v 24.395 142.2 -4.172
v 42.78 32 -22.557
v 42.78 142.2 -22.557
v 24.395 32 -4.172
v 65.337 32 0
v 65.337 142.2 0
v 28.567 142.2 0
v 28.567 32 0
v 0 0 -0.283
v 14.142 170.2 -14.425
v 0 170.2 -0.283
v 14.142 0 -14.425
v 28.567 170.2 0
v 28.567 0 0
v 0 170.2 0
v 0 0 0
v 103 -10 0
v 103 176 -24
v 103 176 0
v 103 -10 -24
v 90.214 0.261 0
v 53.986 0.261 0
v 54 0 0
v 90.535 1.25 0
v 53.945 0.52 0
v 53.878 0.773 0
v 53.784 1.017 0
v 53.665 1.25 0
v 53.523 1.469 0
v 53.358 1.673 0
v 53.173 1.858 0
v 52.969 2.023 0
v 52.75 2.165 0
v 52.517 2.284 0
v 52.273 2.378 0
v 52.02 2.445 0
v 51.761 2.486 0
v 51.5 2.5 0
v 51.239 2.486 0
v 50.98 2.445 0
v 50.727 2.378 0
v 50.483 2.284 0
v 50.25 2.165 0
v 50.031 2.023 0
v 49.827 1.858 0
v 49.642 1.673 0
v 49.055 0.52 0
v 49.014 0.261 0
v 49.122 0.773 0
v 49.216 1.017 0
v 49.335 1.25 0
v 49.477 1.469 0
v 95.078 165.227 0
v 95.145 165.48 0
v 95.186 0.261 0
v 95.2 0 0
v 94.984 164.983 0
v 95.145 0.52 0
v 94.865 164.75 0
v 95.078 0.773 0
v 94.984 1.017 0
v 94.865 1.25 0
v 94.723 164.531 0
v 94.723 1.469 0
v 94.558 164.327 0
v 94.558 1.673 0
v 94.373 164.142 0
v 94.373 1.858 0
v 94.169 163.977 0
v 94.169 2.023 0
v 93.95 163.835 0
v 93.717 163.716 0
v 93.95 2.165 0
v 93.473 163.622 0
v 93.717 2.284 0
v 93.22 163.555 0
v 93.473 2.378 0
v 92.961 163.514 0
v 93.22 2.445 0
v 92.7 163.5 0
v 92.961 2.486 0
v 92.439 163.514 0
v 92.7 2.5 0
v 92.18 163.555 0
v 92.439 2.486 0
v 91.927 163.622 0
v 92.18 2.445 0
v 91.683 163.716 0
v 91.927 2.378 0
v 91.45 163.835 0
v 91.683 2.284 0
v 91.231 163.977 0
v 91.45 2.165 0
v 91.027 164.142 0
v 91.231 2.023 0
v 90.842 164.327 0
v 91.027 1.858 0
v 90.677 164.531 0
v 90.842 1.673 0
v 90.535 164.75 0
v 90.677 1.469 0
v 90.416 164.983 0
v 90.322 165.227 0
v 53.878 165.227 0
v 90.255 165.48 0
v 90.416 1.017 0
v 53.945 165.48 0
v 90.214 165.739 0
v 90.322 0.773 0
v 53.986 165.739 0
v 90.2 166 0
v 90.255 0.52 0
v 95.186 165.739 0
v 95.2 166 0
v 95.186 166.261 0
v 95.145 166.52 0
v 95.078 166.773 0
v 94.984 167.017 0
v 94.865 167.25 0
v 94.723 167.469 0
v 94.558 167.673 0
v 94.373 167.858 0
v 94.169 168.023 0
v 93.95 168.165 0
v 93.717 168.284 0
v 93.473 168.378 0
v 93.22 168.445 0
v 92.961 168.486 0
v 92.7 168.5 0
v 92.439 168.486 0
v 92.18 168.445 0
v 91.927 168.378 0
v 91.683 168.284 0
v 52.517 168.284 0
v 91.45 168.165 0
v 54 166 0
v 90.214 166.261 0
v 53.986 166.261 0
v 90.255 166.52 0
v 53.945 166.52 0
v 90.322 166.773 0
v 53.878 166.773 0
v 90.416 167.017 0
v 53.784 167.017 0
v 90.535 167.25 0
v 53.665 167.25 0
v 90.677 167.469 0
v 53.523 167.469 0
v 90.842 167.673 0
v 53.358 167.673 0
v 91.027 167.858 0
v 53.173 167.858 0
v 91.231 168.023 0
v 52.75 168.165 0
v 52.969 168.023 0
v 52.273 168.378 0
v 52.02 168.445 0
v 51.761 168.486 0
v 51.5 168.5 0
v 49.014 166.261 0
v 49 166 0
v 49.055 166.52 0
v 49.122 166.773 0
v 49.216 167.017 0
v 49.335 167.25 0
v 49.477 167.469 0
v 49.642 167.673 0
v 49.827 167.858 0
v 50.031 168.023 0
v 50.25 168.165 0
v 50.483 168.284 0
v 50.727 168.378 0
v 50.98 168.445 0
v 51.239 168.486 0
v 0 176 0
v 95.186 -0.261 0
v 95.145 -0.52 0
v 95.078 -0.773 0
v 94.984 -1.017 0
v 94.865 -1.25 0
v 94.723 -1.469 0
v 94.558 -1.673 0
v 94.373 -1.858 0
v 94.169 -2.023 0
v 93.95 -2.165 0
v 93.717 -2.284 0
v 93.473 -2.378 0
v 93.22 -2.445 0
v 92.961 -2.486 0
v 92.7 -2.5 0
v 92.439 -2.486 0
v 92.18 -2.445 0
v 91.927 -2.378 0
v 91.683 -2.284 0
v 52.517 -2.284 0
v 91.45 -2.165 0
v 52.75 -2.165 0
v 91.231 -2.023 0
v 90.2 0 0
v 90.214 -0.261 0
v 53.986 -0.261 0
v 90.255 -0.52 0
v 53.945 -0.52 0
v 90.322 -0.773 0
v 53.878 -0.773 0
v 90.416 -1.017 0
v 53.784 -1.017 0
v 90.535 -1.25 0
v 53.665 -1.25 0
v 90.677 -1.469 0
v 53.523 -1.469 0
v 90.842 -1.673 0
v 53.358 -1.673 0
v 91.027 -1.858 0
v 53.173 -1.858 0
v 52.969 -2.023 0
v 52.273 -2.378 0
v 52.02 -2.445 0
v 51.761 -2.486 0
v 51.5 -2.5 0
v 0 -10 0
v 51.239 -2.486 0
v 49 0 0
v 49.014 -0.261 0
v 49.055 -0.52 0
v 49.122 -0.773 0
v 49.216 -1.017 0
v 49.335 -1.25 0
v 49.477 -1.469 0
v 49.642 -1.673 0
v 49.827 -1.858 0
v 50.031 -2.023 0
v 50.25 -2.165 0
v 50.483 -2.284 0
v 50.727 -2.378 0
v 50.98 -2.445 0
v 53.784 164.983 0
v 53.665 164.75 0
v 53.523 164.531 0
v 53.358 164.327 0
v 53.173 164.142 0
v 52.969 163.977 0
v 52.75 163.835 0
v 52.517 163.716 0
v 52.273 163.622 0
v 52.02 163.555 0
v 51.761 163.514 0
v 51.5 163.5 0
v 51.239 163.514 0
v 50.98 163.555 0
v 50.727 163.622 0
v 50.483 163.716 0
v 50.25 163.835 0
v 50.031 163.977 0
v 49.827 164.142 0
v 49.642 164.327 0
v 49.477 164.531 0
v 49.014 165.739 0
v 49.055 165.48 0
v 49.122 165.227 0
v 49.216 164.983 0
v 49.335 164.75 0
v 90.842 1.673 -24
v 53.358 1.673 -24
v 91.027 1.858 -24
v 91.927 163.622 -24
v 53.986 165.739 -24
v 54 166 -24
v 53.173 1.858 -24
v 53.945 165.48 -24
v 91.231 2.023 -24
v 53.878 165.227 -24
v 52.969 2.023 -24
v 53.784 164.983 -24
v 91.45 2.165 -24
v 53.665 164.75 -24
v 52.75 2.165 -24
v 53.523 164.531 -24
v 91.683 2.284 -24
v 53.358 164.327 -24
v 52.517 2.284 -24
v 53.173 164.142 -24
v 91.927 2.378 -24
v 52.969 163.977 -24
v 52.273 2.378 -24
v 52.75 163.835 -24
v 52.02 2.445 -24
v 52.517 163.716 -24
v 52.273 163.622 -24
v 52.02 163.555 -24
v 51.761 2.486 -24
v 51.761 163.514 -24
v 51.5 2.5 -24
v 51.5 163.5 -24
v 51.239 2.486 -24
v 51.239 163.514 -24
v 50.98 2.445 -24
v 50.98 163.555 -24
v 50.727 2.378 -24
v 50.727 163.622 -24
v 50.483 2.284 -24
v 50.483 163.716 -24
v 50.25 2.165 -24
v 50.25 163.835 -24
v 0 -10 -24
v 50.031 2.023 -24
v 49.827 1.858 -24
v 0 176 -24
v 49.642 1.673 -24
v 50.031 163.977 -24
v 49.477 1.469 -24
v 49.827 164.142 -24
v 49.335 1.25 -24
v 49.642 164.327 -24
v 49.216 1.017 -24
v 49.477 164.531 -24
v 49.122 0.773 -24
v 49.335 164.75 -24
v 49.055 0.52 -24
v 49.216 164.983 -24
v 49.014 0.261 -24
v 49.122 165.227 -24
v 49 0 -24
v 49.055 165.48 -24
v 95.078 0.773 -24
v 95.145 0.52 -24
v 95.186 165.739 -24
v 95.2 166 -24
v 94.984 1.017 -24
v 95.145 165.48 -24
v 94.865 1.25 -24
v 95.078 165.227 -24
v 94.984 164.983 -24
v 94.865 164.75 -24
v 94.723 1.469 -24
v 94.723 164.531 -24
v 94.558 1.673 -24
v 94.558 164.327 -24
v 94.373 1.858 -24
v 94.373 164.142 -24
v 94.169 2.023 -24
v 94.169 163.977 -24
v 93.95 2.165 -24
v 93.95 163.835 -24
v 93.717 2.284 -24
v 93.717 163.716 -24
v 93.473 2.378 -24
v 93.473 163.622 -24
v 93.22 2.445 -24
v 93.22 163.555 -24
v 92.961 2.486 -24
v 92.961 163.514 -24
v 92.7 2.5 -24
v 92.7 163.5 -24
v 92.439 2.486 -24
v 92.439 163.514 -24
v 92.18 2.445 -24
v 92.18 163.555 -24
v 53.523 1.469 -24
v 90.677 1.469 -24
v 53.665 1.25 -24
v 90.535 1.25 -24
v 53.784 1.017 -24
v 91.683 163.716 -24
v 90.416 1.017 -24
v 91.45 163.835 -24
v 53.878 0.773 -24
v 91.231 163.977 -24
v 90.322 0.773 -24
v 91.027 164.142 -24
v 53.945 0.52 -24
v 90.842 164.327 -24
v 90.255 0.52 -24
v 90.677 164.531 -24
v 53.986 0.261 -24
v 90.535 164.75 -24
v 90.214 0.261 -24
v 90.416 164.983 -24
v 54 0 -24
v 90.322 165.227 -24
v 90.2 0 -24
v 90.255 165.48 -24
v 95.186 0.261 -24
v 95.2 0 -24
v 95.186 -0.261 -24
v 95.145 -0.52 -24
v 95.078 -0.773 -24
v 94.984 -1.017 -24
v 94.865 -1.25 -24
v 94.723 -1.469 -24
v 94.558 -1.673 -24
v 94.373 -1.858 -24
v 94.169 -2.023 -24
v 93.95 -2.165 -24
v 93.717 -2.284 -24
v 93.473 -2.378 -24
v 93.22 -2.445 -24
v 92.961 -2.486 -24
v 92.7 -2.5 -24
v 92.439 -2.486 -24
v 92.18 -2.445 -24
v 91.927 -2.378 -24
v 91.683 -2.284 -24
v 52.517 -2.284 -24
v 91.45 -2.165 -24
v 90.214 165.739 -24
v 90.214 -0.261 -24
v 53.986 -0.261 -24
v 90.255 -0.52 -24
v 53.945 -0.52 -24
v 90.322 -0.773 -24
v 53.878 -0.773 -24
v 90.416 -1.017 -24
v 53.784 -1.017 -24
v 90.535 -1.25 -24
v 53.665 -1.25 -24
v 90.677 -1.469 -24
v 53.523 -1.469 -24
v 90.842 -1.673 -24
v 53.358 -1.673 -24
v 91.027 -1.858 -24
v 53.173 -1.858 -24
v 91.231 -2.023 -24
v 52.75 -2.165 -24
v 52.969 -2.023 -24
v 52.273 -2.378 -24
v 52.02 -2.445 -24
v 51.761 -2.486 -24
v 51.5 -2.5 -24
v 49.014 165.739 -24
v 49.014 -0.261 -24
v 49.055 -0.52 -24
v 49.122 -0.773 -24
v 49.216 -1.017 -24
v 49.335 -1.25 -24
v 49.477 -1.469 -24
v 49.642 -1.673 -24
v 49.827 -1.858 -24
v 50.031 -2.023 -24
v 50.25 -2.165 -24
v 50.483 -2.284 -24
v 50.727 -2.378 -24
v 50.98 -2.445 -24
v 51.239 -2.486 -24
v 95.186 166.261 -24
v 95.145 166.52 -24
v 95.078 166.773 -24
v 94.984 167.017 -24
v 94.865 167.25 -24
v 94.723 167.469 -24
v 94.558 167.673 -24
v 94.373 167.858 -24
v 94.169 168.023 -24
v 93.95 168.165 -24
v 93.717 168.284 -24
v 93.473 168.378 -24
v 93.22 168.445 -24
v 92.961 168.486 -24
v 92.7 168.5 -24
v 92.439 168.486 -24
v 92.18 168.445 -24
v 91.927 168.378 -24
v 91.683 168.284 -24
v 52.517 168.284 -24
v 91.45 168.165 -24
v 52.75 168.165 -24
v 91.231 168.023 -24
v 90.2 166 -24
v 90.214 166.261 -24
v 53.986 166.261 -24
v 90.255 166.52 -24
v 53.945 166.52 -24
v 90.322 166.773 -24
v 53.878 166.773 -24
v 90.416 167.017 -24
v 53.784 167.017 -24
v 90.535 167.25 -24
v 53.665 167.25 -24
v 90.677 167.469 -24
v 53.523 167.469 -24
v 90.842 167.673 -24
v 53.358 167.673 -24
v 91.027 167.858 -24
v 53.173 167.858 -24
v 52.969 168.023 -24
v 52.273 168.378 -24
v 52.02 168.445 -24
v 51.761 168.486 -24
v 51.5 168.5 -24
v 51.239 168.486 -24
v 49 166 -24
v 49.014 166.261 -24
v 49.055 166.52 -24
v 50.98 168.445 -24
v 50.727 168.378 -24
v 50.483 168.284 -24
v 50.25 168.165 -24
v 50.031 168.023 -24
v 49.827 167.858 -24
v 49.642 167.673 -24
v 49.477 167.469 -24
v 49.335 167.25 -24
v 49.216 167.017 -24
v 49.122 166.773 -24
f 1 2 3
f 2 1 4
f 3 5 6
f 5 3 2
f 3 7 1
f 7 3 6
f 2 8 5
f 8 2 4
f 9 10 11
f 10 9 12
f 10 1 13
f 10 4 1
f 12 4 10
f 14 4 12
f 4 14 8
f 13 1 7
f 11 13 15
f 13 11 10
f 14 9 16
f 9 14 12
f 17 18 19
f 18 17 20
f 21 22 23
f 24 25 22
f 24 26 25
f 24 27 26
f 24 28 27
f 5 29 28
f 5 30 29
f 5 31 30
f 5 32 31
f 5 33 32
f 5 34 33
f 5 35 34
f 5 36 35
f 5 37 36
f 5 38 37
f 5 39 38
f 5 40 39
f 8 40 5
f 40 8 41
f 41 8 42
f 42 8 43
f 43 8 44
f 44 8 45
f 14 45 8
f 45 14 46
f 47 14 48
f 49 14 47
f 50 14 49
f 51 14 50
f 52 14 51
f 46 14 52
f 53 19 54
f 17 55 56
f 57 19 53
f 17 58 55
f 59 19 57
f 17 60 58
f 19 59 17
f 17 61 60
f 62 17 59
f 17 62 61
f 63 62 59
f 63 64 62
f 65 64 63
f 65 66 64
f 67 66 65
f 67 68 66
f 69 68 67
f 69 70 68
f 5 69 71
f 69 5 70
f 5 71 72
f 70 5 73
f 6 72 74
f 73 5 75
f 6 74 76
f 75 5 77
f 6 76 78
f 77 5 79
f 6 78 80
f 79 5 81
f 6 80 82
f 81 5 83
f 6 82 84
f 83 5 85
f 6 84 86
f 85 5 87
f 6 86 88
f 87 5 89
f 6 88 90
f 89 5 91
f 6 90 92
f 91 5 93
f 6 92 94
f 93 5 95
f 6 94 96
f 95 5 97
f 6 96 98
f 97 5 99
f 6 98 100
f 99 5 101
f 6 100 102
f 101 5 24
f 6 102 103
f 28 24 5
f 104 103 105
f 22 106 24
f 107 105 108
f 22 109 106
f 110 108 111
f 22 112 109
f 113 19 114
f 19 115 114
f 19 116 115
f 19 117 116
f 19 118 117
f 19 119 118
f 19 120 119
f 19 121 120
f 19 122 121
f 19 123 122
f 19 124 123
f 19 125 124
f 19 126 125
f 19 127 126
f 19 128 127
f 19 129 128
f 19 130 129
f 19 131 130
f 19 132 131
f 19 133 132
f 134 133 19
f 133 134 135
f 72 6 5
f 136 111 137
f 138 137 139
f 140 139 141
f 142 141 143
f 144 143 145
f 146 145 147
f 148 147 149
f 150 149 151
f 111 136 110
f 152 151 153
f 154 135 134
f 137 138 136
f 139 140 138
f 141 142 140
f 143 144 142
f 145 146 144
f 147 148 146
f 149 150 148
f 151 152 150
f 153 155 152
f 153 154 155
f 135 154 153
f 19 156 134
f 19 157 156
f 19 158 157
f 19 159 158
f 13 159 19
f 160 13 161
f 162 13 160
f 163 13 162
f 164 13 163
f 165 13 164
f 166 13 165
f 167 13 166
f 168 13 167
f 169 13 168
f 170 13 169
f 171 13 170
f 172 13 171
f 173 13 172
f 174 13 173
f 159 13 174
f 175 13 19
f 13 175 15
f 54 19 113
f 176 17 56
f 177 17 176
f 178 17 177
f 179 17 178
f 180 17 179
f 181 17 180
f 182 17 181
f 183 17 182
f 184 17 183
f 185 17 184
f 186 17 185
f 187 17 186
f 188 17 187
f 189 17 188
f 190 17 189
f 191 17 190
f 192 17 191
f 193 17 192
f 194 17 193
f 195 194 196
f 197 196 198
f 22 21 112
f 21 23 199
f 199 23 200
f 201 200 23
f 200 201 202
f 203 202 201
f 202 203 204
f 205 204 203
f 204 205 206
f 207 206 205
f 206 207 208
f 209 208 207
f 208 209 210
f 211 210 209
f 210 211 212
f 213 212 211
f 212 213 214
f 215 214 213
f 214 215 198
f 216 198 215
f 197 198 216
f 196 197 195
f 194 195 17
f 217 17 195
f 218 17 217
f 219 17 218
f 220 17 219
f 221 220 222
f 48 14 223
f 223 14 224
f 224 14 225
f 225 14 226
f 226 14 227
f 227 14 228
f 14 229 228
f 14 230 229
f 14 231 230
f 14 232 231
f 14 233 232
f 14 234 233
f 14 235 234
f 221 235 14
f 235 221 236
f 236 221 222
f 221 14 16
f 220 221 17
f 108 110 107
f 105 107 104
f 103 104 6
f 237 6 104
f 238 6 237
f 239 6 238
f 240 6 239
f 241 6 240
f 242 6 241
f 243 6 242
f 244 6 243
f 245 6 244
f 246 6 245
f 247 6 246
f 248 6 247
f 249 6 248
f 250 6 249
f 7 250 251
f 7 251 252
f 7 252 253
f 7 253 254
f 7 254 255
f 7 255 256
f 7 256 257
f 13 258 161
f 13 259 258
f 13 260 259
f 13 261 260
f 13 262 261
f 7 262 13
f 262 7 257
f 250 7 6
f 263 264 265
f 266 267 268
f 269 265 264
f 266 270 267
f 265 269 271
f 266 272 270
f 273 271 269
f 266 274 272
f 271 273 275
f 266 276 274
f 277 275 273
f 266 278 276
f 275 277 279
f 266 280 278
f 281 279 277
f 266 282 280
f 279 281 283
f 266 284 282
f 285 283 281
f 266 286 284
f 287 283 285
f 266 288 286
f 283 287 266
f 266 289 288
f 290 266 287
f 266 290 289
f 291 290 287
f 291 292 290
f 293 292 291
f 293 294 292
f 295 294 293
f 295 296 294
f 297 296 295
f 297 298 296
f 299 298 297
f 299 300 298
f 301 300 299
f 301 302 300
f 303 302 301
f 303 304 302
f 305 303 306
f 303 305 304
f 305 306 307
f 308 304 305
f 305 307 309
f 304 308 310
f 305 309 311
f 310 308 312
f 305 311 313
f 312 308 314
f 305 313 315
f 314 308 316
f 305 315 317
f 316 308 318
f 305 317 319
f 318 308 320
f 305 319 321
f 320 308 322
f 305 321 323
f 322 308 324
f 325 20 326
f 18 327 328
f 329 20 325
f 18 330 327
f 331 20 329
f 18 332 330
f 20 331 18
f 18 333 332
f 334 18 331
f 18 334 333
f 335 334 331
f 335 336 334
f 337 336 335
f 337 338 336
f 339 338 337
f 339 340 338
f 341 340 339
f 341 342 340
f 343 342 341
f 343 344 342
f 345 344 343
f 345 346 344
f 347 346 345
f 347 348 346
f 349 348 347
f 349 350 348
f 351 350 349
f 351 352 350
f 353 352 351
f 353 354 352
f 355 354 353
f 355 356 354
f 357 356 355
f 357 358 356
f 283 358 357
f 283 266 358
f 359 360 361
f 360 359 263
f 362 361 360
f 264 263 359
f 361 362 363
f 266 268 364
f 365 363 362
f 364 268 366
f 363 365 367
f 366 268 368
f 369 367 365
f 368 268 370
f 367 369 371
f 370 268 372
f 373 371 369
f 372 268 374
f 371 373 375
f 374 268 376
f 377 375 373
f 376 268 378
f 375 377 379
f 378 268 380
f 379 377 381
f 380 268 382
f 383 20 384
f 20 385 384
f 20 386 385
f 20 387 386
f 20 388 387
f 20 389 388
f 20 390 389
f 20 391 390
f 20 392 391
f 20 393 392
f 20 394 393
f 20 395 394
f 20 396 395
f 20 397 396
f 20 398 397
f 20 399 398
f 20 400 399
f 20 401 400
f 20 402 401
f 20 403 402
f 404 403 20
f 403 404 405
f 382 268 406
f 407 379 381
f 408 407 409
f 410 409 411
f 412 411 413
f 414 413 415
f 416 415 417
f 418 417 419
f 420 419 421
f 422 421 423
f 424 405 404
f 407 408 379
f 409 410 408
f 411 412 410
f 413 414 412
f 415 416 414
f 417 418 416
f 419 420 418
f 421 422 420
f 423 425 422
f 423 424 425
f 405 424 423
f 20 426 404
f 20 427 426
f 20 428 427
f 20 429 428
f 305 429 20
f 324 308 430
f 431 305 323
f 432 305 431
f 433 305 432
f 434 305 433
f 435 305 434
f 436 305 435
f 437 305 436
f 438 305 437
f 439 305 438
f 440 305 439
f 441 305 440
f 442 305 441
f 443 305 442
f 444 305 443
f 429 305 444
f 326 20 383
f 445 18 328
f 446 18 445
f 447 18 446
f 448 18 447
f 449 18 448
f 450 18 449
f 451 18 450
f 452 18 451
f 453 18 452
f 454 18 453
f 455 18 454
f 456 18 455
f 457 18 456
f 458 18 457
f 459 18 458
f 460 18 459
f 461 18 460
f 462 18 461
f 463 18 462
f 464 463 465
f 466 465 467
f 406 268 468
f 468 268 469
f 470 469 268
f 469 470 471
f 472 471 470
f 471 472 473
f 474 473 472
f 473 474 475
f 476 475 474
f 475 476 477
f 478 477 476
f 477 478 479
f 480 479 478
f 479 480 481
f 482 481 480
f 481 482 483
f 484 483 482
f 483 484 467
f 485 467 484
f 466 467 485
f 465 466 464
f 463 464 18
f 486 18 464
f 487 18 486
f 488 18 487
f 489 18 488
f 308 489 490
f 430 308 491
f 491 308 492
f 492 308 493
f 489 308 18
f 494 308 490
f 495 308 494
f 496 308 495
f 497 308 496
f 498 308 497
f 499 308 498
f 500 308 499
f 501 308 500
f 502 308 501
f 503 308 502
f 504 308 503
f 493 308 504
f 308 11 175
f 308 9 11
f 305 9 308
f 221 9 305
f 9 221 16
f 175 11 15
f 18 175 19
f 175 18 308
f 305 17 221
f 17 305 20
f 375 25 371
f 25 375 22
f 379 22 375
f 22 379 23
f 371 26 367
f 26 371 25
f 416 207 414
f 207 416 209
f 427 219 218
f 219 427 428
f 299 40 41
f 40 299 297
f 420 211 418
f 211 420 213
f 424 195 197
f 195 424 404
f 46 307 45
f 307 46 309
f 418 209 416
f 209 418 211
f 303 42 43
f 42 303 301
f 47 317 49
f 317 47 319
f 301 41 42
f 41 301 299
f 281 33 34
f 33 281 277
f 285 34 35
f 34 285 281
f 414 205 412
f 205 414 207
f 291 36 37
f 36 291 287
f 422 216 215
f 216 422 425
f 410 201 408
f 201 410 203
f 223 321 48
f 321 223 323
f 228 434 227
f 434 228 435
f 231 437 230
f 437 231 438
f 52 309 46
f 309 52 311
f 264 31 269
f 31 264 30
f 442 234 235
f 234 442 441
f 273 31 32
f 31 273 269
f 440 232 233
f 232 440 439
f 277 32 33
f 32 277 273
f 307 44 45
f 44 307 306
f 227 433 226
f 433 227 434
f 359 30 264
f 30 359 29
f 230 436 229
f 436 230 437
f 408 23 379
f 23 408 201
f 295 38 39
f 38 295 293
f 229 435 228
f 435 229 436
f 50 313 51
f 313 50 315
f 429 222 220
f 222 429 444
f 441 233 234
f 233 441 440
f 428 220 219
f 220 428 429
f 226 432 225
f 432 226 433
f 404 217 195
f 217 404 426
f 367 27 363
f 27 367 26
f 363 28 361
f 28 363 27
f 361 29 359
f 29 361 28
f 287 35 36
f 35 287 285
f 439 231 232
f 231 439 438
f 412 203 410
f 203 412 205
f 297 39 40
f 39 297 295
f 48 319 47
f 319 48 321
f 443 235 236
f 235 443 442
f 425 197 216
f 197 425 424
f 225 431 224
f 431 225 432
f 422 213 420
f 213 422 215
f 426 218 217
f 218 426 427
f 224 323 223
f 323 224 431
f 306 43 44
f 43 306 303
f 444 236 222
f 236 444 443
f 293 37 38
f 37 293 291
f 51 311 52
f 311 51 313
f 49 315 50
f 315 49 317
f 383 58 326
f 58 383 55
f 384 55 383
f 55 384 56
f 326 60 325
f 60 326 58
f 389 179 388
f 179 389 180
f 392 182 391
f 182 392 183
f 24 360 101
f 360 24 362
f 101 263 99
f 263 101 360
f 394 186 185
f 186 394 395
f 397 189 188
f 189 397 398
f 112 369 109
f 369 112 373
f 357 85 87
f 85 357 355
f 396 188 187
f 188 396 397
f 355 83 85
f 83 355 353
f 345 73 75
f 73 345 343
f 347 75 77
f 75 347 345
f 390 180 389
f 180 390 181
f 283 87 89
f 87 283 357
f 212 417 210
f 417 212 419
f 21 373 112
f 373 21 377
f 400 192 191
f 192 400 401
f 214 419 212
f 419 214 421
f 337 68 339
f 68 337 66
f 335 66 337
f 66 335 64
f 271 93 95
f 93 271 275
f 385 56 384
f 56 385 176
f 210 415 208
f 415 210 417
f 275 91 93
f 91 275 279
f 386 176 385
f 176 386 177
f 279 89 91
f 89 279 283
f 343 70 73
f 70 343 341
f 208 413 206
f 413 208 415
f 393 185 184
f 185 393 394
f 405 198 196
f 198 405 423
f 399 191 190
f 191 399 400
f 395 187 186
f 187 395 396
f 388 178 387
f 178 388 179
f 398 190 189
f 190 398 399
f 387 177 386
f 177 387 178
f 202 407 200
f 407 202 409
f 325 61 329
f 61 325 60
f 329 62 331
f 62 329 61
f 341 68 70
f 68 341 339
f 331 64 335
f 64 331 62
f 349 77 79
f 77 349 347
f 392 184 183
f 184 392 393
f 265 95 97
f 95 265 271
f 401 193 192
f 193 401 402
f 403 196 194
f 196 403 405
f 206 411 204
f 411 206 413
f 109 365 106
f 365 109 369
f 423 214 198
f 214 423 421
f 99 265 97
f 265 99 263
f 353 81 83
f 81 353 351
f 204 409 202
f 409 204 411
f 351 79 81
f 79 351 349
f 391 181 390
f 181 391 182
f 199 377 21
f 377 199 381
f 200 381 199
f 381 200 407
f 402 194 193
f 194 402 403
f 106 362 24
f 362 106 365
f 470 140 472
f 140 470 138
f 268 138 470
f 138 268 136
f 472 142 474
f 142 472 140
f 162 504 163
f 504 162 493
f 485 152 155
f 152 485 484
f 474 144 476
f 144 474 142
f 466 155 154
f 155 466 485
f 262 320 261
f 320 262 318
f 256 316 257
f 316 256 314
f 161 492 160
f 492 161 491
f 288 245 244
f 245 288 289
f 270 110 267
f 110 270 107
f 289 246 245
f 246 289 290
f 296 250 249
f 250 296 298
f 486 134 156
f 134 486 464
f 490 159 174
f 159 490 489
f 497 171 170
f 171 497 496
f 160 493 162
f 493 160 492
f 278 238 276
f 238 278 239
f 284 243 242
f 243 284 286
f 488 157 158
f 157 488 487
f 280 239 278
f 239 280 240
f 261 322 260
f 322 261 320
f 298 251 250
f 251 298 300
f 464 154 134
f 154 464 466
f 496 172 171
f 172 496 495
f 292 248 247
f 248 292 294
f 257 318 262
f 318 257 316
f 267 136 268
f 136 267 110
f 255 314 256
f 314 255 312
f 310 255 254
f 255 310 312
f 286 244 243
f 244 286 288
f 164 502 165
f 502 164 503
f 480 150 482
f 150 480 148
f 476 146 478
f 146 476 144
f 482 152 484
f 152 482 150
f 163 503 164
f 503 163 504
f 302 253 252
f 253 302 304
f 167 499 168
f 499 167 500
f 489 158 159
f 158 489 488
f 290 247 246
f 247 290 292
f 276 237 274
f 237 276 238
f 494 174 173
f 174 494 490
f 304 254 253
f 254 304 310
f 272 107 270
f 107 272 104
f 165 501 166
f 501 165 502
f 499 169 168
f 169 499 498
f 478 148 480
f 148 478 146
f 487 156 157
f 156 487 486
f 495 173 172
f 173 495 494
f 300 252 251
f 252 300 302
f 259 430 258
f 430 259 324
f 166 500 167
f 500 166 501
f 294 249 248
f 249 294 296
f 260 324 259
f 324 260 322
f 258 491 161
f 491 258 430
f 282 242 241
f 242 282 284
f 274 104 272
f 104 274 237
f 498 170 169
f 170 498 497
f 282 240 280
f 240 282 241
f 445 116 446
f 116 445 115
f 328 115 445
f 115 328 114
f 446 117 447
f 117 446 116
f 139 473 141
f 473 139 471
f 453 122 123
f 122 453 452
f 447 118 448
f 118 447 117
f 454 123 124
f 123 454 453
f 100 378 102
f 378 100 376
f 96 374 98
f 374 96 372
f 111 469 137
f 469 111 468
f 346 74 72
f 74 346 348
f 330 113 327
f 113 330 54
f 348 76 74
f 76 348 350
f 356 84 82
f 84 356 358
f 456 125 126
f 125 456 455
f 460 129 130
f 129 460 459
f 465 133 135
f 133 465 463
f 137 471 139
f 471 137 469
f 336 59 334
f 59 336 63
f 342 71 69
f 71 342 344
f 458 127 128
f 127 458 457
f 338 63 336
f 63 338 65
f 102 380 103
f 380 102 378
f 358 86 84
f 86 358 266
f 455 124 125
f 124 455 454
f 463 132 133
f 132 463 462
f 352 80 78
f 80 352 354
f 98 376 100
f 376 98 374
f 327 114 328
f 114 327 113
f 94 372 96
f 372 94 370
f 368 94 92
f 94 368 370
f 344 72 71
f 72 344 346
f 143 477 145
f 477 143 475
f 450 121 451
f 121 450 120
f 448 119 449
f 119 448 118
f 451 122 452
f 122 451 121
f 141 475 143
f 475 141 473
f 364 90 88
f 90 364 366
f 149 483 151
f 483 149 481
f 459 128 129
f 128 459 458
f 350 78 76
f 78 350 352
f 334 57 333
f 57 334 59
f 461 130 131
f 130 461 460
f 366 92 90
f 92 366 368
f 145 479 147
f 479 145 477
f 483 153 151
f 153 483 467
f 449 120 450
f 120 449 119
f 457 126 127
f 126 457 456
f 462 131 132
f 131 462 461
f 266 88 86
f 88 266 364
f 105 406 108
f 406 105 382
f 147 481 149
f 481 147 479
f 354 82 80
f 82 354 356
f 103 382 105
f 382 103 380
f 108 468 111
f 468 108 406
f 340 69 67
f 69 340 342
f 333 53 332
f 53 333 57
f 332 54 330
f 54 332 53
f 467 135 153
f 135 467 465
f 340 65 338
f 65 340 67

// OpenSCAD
wall = 2;
printer_marge = 0.2;

led_x_tftt = 3;
led_x_right = 9;
led_y_top = 3;
led_y_bottom = 4;

pi_x = 63.5;
pi_y = 110;
pi_z = 30;
pi_x_left = 90.5-pi_x;
pi_y_bottom = 140-pi_y;

pi_usb_x = 56;
pi_usb_z = 19;

pi_hdmi_y = 60;
pi_hdmi_z = 11;
pi_hdmi_bottom = 59;

box_x = 103;
box_y = 166 ;
box_z = 16;

hole_d = 4;
hole_axe = 5-hole_d/2;
$fn=60;

module box_ext(full = false) {
  difference() {
    if (full == false) {
      cube([box_x+wall*2, box_y+wall*2, box_z+wall*2]);
      translate([wall, wall, wall])
        cube([box_x, box_y, box_z+wall*2]);

      translate([wall+led_x_tftt, wall+led_y_bottom, -0.1])
        cube([box_x-led_x_tftt-led_x_right, box_y-led_y_top-led_y_bottom, box_z]);
    } else {
      cube([box_x+wall*2+printer_marge, box_y+wall*2+printer_marge, box_z+wall*2+printer_marge]);
    }
  }
}

module box_int(full = false) {
  union(){
    difference() {
      translate([wall, wall, box_z])
        if (full == false)
          cube([box_x-0.15, box_y-0.15, wall*2]);
        else
          cube([box_x, box_y, wall*2]);

      if (full == false) {
        translate([wall+pi_x_left, wall+pi_y_bottom, box_z])
          cube([pi_x, pi_y, wall*2]);
          
        // Screws
        translate([wall*2+hole_axe, wall*2+hole_axe, box_z])
          cylinder(wall*3, d=hole_d, center = false);

        translate([box_x-hole_axe, wall*2+hole_axe, box_z])
          cylinder(wall*3, d=hole_d, center = false);

        translate([wall*2+hole_axe, box_y-hole_axe, box_z])
          cylinder(wall*3, d=hole_d, center = false);

        translate([box_x-hole_axe, box_y-hole_axe, box_z])
          cylinder(wall*3, d=hole_d, center = false);
      }
    }
    
    difference() {
      translate([wall+pi_x_left, wall+pi_y_bottom, box_z])
        if (full == false)
          cube([pi_x, pi_y, pi_z]);
        else
          cube([pi_x+printer_marge, pi_y+printer_marge, pi_z+printer_marge]);

      if (full == false) {
        translate([wall+pi_x_left+wall, wall+pi_y_bottom+wall, box_z])
          cube([pi_x-wall*2, pi_y-wall*2, pi_z-wall*2]);

        // ports USB
        translate([wall+pi_x_left+wall, pi_y_bottom+wall, box_z+wall*2])
          cube([pi_usb_x, wall, pi_usb_z]);

        // ports USBc & HDMI
        translate([wall+pi_x_left, pi_hdmi_bottom, box_z+wall*2])
          cube([wall, pi_hdmi_y, pi_hdmi_z]);
      }
    }
  }
}

module box(full = false) {
  box_ext(full);
  box_int(full);
}

module socle() {
  hole_d = 5;
  difference() {
    translate([0, -10, -box_z*1.5])
      cube([box_x, box_y+20, box_z*1.5]);

      
    translate([box_x*0.5, 0, -box_z*1.8])
      cylinder(box_z*2, d=hole_d, center = false);
    translate([box_x*0.9, 0, -box_z*1.8])
      cylinder(box_z*2, d=hole_d, center = false);
    translate([box_x*0.5, box_y, -box_z*1.8])
      cylinder(box_z*2, d=hole_d, center = false);
    translate([box_x*0.9, box_y, -box_z*1.8])
      cylinder(box_z*2, d=hole_d, center = false);
      
    rotate([0, 45, 0])
      translate([0, 0, box_x/2+wall*3])
        rotate([0, 90, 0])
          translate([-(box_x-wall*2)/2, 0, 0])
            box(full=true);
  }
}

socle();
